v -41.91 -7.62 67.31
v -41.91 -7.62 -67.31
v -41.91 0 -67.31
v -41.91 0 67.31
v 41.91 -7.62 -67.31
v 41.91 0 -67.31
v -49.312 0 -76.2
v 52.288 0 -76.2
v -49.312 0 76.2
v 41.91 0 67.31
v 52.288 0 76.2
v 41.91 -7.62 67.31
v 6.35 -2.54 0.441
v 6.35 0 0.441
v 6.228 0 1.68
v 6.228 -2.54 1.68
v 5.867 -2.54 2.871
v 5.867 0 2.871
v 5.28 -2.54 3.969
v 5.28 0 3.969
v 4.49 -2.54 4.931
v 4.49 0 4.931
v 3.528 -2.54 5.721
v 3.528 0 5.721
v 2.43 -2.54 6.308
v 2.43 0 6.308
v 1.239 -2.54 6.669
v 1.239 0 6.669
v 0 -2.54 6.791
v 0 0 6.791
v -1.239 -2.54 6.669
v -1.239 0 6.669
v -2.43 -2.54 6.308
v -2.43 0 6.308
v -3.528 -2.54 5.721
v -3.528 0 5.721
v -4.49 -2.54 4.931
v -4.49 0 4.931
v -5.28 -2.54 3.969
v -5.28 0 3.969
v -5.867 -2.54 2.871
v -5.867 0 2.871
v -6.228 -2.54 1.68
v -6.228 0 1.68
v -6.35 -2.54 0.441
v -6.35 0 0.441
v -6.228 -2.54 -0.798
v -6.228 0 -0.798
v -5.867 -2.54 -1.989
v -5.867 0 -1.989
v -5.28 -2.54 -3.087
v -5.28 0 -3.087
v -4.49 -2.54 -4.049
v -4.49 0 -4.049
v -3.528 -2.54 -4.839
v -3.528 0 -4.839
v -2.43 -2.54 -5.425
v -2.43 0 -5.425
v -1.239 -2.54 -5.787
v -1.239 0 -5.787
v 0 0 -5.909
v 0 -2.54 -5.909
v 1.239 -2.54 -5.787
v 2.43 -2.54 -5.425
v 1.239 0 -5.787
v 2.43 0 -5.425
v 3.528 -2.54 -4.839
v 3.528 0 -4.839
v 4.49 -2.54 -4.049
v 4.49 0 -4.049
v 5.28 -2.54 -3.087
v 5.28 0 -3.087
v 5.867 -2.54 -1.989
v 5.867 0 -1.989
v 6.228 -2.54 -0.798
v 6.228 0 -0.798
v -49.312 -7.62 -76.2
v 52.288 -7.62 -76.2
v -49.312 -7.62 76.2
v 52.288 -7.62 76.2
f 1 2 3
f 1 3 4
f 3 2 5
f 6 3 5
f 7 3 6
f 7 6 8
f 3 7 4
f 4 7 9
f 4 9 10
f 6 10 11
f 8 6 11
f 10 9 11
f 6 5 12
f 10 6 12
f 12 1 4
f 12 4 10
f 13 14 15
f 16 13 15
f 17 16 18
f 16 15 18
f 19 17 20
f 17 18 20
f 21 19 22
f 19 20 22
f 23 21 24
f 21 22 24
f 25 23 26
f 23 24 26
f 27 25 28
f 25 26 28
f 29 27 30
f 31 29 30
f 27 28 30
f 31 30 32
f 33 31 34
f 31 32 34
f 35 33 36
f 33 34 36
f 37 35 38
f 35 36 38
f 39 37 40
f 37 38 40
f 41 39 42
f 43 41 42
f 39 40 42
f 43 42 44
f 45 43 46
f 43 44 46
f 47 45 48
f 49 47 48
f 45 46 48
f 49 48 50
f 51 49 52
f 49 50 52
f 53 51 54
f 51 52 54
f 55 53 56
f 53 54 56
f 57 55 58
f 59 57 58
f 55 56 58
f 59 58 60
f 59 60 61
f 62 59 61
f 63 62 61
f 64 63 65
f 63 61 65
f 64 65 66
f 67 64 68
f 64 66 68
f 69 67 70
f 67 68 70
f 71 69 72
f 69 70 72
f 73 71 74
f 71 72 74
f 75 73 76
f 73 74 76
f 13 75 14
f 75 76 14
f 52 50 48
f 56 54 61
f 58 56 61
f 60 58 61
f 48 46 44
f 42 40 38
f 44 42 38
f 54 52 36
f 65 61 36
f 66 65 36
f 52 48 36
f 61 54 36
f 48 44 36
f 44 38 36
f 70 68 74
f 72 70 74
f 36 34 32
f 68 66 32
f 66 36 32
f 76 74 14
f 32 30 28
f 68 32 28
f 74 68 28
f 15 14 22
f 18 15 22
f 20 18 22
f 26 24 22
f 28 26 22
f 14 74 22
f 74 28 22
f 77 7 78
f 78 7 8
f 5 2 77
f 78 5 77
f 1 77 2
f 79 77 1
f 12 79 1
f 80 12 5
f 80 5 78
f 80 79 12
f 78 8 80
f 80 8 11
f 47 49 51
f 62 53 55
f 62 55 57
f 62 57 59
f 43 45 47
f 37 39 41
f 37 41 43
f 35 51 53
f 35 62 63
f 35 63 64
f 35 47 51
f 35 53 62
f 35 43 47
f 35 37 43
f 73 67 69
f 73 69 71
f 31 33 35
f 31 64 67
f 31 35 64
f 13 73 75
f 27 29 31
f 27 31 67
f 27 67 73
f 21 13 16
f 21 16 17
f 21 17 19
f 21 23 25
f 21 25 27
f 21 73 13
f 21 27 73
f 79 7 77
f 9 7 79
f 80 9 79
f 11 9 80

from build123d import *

# Parameters (mm, degrees)
F0_W     = 101.6
F0_H     = 152.4
F1_DEPTH = 7.62
F2_W     = 83.82
F2_H     = 134.62
F3_DEPTH = 25.4
F4_R     = 6.35
F5_DEPTH = 2.54


with BuildPart() as f1:
    # F0 (on Front) → F1 (new body)
    with BuildSketch(Plane.XZ):
        with Locations((1.487515, 0)):
            Rectangle(F0_W, F0_H)
    extrude(amount=F1_DEPTH)

    # F2 (on face) → F3 (cut)
    with BuildSketch(Plane.XZ.offset(7.62)):
        Rectangle(F2_W, F2_H)
    extrude(amount=-F3_DEPTH, mode=Mode.SUBTRACT)


with BuildPart() as f5:
    # F4 (on Front) → F5 (new body)
    with BuildSketch(Plane.XZ):
        with Locations((0, 0.441222)):
            Circle(F4_R)
    extrude(amount=F5_DEPTH)


solid = Compound([f1.part, f5.part])
